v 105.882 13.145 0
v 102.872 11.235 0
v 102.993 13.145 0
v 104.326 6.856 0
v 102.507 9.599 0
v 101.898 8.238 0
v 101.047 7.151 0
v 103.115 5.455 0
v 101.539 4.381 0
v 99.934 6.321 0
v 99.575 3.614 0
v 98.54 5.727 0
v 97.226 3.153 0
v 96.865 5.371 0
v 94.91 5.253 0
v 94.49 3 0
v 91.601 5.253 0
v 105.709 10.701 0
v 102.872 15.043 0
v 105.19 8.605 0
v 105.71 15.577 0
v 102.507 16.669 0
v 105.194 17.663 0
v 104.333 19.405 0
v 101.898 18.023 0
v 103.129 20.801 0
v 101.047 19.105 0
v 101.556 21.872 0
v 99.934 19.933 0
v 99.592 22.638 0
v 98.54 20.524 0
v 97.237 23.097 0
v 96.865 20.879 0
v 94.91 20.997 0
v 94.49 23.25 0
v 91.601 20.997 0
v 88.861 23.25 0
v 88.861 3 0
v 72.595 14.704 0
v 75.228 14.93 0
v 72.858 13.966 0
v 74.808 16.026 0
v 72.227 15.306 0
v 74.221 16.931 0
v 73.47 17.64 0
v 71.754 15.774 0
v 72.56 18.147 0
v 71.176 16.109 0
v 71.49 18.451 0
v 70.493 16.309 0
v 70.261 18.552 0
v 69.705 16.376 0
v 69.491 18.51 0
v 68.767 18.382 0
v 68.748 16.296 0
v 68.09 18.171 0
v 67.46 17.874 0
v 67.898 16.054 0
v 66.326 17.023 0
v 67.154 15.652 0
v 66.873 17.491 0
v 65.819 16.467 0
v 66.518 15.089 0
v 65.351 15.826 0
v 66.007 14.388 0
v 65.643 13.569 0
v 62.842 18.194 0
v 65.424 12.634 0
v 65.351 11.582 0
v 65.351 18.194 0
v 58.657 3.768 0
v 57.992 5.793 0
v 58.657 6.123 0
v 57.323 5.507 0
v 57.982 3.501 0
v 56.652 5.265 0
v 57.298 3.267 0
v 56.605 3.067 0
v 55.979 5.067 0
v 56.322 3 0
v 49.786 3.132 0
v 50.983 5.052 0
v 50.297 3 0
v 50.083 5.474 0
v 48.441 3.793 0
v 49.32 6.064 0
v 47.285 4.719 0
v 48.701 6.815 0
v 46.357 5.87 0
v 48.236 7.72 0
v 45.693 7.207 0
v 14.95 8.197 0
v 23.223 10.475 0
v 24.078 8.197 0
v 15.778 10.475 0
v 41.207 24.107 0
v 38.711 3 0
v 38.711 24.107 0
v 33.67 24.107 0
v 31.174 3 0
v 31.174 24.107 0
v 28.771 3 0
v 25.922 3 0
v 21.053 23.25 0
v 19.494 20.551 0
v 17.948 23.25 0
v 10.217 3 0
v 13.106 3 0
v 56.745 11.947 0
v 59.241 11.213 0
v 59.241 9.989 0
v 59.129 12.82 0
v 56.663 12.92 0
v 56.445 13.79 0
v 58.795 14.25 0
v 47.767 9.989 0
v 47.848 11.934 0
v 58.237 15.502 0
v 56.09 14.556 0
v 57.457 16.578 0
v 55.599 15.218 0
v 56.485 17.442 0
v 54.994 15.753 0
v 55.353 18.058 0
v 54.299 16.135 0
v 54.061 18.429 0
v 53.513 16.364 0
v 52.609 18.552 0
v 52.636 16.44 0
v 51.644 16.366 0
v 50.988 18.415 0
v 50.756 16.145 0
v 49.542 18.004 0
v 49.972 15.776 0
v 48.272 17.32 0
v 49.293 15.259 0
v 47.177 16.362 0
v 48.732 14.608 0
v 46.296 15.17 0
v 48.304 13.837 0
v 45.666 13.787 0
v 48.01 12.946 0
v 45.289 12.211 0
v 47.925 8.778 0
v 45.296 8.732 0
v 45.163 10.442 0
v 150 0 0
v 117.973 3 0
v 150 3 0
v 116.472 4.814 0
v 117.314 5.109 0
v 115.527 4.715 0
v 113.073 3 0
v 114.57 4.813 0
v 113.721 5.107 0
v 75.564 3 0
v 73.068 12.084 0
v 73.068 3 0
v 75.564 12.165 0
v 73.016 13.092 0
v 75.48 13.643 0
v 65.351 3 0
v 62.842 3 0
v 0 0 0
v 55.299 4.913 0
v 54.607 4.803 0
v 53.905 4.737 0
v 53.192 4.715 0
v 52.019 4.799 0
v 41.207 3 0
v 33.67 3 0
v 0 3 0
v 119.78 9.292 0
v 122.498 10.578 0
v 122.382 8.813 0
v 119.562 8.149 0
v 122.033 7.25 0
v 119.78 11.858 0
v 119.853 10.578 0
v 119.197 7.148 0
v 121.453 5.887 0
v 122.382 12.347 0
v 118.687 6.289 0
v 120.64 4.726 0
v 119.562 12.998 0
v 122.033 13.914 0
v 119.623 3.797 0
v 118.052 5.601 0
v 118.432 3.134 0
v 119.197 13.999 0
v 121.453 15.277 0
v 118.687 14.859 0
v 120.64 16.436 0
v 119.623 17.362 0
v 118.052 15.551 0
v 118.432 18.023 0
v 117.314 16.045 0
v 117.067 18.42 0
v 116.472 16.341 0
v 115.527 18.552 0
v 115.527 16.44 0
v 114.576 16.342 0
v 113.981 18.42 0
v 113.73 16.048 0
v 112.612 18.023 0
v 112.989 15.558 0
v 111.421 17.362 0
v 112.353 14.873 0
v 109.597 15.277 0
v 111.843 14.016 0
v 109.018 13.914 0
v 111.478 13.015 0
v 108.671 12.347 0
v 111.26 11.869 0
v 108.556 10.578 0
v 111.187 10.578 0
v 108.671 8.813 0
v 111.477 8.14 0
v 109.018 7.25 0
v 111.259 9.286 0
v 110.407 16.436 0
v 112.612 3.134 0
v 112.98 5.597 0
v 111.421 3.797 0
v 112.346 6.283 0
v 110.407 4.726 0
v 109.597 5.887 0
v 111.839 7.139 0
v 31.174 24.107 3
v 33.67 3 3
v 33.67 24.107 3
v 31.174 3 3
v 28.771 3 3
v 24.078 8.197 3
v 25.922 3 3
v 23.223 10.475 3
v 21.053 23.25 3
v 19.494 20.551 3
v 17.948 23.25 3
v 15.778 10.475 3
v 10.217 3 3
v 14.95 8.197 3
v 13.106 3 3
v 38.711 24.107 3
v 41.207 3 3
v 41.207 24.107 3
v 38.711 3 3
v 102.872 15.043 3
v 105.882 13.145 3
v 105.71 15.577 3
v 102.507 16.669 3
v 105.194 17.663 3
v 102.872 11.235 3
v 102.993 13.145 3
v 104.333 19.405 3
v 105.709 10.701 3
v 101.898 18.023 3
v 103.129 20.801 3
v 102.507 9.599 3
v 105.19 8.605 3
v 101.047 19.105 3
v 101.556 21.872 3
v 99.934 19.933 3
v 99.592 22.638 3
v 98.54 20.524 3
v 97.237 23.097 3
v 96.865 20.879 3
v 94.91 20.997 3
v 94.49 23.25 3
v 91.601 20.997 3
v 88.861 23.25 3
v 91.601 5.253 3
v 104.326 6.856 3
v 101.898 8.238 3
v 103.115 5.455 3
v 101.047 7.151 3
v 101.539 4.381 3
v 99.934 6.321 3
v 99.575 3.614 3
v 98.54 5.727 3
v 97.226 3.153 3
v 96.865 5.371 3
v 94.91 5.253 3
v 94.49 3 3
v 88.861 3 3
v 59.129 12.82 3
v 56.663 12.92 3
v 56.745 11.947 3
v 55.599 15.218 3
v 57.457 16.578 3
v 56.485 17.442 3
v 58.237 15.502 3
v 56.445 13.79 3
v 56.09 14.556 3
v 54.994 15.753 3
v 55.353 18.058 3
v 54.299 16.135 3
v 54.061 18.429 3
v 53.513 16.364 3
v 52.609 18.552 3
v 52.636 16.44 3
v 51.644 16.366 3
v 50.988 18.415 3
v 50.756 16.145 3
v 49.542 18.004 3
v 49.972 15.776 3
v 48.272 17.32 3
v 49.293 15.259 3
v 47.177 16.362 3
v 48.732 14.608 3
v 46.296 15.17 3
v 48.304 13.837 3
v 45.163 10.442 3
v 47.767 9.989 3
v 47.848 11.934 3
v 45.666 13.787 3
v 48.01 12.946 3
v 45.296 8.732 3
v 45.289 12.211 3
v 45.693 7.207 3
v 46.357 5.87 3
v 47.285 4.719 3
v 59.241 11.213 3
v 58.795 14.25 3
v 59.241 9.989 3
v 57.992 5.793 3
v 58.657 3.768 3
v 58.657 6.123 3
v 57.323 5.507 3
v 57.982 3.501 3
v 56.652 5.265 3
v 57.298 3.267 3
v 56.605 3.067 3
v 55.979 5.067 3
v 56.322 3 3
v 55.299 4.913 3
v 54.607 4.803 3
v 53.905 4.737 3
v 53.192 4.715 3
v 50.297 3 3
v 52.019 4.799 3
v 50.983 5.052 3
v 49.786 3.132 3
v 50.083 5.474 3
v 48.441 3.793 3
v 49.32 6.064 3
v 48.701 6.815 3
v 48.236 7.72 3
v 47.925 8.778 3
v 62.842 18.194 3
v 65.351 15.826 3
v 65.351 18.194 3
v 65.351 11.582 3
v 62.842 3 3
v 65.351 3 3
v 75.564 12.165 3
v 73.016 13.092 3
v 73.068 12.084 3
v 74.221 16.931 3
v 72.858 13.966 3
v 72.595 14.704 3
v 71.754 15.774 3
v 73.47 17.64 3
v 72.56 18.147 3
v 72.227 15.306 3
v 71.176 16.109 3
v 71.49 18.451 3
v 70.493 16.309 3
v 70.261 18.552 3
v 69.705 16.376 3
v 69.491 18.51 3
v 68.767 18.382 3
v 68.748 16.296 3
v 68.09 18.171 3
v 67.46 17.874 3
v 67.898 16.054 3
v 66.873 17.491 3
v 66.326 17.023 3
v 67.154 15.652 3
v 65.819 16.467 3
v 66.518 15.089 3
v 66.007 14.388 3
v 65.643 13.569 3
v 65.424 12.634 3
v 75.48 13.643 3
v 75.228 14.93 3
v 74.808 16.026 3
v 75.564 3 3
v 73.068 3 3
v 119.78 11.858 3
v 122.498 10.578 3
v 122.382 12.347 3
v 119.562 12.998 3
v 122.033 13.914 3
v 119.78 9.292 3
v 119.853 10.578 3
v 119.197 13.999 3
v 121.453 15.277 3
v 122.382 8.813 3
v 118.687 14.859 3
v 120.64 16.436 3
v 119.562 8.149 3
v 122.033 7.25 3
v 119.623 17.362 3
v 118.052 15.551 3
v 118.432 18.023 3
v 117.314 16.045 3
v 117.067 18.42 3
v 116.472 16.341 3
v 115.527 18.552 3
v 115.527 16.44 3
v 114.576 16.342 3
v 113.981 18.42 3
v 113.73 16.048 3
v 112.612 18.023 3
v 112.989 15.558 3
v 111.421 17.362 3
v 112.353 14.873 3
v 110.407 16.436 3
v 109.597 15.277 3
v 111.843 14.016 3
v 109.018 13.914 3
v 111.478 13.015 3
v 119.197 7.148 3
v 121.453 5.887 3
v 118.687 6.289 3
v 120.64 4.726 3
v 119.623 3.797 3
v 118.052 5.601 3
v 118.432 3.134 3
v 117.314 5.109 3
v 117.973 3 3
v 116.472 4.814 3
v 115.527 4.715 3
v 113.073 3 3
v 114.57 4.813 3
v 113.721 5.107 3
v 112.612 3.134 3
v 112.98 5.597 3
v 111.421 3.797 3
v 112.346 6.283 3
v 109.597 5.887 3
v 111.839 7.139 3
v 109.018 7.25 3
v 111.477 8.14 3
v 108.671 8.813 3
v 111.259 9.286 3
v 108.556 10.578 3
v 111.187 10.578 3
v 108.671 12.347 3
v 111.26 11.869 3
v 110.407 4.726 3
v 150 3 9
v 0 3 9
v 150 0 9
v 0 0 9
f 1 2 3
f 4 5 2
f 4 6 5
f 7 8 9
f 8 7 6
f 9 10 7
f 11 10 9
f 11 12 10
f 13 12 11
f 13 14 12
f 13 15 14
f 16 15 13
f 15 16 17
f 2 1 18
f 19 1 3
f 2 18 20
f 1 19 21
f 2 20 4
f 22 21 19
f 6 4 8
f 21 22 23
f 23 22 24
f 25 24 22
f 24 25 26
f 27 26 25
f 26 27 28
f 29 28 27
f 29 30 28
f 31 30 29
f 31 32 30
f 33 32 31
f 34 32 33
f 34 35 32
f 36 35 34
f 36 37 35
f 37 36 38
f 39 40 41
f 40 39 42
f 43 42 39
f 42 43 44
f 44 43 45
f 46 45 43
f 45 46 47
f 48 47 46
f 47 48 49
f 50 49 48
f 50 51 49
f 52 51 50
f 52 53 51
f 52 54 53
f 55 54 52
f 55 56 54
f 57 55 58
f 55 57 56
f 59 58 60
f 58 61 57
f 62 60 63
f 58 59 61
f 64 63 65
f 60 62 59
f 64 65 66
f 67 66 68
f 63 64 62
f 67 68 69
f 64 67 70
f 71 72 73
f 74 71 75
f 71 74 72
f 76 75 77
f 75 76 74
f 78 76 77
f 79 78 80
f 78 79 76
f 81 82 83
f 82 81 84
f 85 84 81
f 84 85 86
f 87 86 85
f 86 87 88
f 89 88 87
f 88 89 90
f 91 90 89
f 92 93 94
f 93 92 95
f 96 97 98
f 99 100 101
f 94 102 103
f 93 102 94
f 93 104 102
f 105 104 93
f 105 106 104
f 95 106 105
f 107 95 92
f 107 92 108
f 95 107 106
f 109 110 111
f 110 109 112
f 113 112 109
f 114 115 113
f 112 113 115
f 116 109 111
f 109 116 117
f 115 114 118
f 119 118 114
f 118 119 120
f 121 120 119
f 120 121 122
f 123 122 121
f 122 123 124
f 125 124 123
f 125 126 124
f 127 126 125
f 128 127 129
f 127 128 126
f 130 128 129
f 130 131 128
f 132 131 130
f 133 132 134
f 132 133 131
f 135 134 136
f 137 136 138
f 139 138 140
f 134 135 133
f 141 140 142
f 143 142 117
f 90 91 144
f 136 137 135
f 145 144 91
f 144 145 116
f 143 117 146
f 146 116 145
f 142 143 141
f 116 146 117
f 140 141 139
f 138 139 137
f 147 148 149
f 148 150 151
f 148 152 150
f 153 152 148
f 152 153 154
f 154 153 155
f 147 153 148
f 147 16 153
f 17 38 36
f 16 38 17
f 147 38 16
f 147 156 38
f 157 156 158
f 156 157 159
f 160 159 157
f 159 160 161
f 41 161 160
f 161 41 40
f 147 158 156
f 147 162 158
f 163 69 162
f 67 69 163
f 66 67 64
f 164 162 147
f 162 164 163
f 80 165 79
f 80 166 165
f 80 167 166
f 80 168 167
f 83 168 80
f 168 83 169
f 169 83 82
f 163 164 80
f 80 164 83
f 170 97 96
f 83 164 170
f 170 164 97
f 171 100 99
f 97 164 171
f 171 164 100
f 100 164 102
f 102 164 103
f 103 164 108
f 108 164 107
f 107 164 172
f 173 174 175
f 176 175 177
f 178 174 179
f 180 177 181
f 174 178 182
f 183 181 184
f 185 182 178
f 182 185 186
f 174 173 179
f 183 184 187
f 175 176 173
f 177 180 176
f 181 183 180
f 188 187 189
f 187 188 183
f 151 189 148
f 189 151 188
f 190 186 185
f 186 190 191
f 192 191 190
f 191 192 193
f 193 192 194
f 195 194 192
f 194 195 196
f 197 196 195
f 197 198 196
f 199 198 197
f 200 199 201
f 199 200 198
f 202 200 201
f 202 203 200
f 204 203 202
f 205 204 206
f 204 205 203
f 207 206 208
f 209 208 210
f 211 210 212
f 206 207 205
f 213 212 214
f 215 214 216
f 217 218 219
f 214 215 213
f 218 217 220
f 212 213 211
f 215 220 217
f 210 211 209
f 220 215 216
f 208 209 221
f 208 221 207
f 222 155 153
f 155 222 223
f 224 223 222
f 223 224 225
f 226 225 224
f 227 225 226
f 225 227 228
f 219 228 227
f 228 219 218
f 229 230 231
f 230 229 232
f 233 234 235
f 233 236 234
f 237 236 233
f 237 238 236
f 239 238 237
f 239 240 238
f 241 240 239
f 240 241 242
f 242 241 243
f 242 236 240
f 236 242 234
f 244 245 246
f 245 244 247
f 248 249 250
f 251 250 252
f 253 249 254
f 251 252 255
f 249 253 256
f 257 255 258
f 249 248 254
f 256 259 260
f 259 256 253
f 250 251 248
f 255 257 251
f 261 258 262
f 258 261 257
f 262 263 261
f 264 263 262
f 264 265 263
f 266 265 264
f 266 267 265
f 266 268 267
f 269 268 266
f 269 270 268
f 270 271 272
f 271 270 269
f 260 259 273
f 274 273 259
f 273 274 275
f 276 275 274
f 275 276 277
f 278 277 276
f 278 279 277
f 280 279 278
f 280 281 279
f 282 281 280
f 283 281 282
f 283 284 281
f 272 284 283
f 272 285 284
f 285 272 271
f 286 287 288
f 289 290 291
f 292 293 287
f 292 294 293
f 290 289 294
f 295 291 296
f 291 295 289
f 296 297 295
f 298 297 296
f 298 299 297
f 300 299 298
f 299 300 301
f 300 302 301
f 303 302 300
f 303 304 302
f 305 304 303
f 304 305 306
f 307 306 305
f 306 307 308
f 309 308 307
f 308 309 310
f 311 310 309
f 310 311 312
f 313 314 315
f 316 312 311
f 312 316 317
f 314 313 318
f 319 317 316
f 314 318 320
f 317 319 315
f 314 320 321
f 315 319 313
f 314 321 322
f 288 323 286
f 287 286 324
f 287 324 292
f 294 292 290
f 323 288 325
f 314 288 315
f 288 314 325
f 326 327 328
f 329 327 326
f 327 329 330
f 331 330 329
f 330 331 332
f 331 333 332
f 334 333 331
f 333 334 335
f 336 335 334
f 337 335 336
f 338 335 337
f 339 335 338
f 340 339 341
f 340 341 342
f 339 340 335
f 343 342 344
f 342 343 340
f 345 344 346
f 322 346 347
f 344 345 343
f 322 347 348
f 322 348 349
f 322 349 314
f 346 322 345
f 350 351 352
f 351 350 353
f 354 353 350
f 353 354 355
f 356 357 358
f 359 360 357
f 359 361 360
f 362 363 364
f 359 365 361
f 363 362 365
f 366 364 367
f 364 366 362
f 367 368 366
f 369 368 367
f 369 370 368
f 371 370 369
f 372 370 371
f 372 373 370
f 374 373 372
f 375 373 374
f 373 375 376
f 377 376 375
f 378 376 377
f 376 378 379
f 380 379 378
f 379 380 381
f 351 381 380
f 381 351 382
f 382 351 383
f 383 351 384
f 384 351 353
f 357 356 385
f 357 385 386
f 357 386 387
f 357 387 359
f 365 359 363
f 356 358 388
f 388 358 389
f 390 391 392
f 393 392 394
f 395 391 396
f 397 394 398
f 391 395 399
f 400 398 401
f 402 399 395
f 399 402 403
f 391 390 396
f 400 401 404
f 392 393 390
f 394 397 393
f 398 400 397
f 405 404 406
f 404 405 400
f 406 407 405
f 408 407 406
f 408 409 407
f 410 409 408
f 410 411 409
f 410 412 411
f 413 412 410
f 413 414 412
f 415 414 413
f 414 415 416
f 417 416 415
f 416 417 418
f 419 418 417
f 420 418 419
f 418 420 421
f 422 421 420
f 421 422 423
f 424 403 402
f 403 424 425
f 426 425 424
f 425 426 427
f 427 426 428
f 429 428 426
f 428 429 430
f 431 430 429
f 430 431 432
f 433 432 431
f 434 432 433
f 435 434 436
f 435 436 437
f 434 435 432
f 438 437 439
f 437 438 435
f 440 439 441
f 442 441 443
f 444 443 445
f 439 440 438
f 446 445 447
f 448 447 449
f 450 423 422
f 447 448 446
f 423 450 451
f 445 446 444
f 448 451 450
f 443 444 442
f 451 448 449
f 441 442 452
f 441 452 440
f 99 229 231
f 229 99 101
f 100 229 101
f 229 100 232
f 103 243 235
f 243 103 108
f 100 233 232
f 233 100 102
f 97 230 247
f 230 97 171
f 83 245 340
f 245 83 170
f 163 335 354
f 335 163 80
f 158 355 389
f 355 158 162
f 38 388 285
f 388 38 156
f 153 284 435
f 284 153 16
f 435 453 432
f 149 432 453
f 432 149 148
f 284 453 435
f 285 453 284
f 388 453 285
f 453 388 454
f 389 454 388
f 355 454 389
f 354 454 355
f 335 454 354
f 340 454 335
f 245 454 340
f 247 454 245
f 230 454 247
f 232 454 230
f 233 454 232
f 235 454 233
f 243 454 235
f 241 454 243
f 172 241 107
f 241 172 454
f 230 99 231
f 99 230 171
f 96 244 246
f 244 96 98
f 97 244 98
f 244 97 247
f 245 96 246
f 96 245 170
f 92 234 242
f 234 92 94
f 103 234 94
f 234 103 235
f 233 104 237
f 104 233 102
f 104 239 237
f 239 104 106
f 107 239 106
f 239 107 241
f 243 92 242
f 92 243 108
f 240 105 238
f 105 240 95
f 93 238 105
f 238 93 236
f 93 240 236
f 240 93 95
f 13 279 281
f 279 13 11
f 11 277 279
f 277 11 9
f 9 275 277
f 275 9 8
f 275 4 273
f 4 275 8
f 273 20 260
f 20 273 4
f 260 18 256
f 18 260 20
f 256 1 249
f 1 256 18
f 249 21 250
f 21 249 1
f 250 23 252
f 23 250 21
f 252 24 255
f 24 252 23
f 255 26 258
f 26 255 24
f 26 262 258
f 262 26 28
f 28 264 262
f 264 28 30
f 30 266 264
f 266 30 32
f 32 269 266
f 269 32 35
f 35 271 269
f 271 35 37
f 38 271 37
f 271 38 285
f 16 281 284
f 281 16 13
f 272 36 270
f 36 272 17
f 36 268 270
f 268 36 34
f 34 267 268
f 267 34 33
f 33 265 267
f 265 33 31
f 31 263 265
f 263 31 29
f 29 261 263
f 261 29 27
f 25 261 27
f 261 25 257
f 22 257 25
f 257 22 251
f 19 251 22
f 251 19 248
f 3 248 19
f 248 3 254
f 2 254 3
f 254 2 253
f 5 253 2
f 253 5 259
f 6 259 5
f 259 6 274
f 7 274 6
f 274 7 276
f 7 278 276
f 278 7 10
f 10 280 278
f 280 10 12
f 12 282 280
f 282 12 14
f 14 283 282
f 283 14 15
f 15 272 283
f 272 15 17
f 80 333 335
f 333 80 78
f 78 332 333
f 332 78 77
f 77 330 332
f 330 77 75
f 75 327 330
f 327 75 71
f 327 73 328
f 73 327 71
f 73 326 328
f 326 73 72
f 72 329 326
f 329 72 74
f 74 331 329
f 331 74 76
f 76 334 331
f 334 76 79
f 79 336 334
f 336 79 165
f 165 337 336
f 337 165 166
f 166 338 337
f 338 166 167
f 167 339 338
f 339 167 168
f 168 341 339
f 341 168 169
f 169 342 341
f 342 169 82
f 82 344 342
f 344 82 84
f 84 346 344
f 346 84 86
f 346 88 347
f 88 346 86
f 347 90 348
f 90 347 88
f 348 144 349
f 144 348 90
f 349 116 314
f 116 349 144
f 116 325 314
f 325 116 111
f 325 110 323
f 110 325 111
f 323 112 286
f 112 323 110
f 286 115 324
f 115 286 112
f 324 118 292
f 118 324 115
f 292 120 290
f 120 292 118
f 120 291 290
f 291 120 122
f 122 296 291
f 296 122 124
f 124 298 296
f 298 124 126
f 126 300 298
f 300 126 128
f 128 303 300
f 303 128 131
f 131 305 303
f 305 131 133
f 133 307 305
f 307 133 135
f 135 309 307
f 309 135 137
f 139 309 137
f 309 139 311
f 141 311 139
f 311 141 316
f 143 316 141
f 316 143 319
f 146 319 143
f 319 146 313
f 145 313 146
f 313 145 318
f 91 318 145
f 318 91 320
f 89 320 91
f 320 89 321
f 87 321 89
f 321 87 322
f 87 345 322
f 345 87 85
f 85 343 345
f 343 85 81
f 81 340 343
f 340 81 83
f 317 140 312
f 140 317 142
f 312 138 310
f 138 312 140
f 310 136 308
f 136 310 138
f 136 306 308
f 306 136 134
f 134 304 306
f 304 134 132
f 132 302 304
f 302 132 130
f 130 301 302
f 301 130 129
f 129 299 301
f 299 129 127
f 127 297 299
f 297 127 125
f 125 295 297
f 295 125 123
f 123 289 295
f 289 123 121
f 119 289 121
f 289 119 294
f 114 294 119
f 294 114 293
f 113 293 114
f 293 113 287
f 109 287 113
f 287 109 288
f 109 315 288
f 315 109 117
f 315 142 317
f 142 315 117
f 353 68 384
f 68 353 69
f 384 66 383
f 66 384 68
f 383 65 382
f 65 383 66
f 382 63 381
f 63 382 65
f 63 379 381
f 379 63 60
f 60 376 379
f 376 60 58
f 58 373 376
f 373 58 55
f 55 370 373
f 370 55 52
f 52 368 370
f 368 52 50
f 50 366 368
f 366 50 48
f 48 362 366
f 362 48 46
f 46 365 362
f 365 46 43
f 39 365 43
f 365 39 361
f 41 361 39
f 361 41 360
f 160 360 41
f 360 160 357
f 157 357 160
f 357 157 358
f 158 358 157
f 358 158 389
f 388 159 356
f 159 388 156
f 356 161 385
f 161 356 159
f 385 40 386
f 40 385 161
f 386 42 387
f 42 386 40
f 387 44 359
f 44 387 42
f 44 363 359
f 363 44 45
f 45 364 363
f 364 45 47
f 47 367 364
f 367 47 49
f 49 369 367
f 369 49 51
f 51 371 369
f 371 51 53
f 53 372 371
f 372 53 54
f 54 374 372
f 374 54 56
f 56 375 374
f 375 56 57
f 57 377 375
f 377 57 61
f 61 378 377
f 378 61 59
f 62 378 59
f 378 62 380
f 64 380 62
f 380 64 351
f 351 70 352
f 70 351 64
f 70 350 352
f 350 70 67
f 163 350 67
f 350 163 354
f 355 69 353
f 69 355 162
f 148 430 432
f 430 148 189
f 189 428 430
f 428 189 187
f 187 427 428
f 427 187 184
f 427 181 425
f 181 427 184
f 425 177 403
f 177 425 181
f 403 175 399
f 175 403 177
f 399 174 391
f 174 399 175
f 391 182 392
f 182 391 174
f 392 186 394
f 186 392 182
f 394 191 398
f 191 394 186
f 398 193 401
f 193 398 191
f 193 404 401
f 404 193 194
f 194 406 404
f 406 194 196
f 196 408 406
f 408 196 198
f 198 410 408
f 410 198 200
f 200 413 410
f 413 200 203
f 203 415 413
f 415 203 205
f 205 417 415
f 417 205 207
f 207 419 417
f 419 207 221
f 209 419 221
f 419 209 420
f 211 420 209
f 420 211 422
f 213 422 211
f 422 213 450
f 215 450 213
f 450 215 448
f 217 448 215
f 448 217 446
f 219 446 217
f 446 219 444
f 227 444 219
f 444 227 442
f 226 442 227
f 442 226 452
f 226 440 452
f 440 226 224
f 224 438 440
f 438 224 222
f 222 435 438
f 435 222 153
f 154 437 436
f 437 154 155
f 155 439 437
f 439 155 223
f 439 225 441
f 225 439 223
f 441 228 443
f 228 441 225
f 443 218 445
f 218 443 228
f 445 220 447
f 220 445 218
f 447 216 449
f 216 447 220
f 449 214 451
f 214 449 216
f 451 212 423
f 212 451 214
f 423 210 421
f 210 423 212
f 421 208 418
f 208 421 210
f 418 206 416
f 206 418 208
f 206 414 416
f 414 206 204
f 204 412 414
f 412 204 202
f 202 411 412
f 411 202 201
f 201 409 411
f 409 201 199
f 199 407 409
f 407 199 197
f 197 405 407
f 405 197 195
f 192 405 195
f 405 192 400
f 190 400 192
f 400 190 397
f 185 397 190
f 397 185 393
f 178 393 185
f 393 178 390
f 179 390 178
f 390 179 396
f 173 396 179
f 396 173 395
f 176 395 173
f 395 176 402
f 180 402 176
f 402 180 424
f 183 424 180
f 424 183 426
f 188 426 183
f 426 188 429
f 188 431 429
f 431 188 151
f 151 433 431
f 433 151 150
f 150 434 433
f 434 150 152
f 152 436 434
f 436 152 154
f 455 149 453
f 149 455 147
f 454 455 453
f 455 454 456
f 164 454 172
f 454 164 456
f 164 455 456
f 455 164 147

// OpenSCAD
// Cascadia Code Semibold
translate([10, 3, 0])
linear_extrude(height=3)
    text("Allen Do", 20, "Microsoft Sans Serif");

cube([150, 3, 9]);
